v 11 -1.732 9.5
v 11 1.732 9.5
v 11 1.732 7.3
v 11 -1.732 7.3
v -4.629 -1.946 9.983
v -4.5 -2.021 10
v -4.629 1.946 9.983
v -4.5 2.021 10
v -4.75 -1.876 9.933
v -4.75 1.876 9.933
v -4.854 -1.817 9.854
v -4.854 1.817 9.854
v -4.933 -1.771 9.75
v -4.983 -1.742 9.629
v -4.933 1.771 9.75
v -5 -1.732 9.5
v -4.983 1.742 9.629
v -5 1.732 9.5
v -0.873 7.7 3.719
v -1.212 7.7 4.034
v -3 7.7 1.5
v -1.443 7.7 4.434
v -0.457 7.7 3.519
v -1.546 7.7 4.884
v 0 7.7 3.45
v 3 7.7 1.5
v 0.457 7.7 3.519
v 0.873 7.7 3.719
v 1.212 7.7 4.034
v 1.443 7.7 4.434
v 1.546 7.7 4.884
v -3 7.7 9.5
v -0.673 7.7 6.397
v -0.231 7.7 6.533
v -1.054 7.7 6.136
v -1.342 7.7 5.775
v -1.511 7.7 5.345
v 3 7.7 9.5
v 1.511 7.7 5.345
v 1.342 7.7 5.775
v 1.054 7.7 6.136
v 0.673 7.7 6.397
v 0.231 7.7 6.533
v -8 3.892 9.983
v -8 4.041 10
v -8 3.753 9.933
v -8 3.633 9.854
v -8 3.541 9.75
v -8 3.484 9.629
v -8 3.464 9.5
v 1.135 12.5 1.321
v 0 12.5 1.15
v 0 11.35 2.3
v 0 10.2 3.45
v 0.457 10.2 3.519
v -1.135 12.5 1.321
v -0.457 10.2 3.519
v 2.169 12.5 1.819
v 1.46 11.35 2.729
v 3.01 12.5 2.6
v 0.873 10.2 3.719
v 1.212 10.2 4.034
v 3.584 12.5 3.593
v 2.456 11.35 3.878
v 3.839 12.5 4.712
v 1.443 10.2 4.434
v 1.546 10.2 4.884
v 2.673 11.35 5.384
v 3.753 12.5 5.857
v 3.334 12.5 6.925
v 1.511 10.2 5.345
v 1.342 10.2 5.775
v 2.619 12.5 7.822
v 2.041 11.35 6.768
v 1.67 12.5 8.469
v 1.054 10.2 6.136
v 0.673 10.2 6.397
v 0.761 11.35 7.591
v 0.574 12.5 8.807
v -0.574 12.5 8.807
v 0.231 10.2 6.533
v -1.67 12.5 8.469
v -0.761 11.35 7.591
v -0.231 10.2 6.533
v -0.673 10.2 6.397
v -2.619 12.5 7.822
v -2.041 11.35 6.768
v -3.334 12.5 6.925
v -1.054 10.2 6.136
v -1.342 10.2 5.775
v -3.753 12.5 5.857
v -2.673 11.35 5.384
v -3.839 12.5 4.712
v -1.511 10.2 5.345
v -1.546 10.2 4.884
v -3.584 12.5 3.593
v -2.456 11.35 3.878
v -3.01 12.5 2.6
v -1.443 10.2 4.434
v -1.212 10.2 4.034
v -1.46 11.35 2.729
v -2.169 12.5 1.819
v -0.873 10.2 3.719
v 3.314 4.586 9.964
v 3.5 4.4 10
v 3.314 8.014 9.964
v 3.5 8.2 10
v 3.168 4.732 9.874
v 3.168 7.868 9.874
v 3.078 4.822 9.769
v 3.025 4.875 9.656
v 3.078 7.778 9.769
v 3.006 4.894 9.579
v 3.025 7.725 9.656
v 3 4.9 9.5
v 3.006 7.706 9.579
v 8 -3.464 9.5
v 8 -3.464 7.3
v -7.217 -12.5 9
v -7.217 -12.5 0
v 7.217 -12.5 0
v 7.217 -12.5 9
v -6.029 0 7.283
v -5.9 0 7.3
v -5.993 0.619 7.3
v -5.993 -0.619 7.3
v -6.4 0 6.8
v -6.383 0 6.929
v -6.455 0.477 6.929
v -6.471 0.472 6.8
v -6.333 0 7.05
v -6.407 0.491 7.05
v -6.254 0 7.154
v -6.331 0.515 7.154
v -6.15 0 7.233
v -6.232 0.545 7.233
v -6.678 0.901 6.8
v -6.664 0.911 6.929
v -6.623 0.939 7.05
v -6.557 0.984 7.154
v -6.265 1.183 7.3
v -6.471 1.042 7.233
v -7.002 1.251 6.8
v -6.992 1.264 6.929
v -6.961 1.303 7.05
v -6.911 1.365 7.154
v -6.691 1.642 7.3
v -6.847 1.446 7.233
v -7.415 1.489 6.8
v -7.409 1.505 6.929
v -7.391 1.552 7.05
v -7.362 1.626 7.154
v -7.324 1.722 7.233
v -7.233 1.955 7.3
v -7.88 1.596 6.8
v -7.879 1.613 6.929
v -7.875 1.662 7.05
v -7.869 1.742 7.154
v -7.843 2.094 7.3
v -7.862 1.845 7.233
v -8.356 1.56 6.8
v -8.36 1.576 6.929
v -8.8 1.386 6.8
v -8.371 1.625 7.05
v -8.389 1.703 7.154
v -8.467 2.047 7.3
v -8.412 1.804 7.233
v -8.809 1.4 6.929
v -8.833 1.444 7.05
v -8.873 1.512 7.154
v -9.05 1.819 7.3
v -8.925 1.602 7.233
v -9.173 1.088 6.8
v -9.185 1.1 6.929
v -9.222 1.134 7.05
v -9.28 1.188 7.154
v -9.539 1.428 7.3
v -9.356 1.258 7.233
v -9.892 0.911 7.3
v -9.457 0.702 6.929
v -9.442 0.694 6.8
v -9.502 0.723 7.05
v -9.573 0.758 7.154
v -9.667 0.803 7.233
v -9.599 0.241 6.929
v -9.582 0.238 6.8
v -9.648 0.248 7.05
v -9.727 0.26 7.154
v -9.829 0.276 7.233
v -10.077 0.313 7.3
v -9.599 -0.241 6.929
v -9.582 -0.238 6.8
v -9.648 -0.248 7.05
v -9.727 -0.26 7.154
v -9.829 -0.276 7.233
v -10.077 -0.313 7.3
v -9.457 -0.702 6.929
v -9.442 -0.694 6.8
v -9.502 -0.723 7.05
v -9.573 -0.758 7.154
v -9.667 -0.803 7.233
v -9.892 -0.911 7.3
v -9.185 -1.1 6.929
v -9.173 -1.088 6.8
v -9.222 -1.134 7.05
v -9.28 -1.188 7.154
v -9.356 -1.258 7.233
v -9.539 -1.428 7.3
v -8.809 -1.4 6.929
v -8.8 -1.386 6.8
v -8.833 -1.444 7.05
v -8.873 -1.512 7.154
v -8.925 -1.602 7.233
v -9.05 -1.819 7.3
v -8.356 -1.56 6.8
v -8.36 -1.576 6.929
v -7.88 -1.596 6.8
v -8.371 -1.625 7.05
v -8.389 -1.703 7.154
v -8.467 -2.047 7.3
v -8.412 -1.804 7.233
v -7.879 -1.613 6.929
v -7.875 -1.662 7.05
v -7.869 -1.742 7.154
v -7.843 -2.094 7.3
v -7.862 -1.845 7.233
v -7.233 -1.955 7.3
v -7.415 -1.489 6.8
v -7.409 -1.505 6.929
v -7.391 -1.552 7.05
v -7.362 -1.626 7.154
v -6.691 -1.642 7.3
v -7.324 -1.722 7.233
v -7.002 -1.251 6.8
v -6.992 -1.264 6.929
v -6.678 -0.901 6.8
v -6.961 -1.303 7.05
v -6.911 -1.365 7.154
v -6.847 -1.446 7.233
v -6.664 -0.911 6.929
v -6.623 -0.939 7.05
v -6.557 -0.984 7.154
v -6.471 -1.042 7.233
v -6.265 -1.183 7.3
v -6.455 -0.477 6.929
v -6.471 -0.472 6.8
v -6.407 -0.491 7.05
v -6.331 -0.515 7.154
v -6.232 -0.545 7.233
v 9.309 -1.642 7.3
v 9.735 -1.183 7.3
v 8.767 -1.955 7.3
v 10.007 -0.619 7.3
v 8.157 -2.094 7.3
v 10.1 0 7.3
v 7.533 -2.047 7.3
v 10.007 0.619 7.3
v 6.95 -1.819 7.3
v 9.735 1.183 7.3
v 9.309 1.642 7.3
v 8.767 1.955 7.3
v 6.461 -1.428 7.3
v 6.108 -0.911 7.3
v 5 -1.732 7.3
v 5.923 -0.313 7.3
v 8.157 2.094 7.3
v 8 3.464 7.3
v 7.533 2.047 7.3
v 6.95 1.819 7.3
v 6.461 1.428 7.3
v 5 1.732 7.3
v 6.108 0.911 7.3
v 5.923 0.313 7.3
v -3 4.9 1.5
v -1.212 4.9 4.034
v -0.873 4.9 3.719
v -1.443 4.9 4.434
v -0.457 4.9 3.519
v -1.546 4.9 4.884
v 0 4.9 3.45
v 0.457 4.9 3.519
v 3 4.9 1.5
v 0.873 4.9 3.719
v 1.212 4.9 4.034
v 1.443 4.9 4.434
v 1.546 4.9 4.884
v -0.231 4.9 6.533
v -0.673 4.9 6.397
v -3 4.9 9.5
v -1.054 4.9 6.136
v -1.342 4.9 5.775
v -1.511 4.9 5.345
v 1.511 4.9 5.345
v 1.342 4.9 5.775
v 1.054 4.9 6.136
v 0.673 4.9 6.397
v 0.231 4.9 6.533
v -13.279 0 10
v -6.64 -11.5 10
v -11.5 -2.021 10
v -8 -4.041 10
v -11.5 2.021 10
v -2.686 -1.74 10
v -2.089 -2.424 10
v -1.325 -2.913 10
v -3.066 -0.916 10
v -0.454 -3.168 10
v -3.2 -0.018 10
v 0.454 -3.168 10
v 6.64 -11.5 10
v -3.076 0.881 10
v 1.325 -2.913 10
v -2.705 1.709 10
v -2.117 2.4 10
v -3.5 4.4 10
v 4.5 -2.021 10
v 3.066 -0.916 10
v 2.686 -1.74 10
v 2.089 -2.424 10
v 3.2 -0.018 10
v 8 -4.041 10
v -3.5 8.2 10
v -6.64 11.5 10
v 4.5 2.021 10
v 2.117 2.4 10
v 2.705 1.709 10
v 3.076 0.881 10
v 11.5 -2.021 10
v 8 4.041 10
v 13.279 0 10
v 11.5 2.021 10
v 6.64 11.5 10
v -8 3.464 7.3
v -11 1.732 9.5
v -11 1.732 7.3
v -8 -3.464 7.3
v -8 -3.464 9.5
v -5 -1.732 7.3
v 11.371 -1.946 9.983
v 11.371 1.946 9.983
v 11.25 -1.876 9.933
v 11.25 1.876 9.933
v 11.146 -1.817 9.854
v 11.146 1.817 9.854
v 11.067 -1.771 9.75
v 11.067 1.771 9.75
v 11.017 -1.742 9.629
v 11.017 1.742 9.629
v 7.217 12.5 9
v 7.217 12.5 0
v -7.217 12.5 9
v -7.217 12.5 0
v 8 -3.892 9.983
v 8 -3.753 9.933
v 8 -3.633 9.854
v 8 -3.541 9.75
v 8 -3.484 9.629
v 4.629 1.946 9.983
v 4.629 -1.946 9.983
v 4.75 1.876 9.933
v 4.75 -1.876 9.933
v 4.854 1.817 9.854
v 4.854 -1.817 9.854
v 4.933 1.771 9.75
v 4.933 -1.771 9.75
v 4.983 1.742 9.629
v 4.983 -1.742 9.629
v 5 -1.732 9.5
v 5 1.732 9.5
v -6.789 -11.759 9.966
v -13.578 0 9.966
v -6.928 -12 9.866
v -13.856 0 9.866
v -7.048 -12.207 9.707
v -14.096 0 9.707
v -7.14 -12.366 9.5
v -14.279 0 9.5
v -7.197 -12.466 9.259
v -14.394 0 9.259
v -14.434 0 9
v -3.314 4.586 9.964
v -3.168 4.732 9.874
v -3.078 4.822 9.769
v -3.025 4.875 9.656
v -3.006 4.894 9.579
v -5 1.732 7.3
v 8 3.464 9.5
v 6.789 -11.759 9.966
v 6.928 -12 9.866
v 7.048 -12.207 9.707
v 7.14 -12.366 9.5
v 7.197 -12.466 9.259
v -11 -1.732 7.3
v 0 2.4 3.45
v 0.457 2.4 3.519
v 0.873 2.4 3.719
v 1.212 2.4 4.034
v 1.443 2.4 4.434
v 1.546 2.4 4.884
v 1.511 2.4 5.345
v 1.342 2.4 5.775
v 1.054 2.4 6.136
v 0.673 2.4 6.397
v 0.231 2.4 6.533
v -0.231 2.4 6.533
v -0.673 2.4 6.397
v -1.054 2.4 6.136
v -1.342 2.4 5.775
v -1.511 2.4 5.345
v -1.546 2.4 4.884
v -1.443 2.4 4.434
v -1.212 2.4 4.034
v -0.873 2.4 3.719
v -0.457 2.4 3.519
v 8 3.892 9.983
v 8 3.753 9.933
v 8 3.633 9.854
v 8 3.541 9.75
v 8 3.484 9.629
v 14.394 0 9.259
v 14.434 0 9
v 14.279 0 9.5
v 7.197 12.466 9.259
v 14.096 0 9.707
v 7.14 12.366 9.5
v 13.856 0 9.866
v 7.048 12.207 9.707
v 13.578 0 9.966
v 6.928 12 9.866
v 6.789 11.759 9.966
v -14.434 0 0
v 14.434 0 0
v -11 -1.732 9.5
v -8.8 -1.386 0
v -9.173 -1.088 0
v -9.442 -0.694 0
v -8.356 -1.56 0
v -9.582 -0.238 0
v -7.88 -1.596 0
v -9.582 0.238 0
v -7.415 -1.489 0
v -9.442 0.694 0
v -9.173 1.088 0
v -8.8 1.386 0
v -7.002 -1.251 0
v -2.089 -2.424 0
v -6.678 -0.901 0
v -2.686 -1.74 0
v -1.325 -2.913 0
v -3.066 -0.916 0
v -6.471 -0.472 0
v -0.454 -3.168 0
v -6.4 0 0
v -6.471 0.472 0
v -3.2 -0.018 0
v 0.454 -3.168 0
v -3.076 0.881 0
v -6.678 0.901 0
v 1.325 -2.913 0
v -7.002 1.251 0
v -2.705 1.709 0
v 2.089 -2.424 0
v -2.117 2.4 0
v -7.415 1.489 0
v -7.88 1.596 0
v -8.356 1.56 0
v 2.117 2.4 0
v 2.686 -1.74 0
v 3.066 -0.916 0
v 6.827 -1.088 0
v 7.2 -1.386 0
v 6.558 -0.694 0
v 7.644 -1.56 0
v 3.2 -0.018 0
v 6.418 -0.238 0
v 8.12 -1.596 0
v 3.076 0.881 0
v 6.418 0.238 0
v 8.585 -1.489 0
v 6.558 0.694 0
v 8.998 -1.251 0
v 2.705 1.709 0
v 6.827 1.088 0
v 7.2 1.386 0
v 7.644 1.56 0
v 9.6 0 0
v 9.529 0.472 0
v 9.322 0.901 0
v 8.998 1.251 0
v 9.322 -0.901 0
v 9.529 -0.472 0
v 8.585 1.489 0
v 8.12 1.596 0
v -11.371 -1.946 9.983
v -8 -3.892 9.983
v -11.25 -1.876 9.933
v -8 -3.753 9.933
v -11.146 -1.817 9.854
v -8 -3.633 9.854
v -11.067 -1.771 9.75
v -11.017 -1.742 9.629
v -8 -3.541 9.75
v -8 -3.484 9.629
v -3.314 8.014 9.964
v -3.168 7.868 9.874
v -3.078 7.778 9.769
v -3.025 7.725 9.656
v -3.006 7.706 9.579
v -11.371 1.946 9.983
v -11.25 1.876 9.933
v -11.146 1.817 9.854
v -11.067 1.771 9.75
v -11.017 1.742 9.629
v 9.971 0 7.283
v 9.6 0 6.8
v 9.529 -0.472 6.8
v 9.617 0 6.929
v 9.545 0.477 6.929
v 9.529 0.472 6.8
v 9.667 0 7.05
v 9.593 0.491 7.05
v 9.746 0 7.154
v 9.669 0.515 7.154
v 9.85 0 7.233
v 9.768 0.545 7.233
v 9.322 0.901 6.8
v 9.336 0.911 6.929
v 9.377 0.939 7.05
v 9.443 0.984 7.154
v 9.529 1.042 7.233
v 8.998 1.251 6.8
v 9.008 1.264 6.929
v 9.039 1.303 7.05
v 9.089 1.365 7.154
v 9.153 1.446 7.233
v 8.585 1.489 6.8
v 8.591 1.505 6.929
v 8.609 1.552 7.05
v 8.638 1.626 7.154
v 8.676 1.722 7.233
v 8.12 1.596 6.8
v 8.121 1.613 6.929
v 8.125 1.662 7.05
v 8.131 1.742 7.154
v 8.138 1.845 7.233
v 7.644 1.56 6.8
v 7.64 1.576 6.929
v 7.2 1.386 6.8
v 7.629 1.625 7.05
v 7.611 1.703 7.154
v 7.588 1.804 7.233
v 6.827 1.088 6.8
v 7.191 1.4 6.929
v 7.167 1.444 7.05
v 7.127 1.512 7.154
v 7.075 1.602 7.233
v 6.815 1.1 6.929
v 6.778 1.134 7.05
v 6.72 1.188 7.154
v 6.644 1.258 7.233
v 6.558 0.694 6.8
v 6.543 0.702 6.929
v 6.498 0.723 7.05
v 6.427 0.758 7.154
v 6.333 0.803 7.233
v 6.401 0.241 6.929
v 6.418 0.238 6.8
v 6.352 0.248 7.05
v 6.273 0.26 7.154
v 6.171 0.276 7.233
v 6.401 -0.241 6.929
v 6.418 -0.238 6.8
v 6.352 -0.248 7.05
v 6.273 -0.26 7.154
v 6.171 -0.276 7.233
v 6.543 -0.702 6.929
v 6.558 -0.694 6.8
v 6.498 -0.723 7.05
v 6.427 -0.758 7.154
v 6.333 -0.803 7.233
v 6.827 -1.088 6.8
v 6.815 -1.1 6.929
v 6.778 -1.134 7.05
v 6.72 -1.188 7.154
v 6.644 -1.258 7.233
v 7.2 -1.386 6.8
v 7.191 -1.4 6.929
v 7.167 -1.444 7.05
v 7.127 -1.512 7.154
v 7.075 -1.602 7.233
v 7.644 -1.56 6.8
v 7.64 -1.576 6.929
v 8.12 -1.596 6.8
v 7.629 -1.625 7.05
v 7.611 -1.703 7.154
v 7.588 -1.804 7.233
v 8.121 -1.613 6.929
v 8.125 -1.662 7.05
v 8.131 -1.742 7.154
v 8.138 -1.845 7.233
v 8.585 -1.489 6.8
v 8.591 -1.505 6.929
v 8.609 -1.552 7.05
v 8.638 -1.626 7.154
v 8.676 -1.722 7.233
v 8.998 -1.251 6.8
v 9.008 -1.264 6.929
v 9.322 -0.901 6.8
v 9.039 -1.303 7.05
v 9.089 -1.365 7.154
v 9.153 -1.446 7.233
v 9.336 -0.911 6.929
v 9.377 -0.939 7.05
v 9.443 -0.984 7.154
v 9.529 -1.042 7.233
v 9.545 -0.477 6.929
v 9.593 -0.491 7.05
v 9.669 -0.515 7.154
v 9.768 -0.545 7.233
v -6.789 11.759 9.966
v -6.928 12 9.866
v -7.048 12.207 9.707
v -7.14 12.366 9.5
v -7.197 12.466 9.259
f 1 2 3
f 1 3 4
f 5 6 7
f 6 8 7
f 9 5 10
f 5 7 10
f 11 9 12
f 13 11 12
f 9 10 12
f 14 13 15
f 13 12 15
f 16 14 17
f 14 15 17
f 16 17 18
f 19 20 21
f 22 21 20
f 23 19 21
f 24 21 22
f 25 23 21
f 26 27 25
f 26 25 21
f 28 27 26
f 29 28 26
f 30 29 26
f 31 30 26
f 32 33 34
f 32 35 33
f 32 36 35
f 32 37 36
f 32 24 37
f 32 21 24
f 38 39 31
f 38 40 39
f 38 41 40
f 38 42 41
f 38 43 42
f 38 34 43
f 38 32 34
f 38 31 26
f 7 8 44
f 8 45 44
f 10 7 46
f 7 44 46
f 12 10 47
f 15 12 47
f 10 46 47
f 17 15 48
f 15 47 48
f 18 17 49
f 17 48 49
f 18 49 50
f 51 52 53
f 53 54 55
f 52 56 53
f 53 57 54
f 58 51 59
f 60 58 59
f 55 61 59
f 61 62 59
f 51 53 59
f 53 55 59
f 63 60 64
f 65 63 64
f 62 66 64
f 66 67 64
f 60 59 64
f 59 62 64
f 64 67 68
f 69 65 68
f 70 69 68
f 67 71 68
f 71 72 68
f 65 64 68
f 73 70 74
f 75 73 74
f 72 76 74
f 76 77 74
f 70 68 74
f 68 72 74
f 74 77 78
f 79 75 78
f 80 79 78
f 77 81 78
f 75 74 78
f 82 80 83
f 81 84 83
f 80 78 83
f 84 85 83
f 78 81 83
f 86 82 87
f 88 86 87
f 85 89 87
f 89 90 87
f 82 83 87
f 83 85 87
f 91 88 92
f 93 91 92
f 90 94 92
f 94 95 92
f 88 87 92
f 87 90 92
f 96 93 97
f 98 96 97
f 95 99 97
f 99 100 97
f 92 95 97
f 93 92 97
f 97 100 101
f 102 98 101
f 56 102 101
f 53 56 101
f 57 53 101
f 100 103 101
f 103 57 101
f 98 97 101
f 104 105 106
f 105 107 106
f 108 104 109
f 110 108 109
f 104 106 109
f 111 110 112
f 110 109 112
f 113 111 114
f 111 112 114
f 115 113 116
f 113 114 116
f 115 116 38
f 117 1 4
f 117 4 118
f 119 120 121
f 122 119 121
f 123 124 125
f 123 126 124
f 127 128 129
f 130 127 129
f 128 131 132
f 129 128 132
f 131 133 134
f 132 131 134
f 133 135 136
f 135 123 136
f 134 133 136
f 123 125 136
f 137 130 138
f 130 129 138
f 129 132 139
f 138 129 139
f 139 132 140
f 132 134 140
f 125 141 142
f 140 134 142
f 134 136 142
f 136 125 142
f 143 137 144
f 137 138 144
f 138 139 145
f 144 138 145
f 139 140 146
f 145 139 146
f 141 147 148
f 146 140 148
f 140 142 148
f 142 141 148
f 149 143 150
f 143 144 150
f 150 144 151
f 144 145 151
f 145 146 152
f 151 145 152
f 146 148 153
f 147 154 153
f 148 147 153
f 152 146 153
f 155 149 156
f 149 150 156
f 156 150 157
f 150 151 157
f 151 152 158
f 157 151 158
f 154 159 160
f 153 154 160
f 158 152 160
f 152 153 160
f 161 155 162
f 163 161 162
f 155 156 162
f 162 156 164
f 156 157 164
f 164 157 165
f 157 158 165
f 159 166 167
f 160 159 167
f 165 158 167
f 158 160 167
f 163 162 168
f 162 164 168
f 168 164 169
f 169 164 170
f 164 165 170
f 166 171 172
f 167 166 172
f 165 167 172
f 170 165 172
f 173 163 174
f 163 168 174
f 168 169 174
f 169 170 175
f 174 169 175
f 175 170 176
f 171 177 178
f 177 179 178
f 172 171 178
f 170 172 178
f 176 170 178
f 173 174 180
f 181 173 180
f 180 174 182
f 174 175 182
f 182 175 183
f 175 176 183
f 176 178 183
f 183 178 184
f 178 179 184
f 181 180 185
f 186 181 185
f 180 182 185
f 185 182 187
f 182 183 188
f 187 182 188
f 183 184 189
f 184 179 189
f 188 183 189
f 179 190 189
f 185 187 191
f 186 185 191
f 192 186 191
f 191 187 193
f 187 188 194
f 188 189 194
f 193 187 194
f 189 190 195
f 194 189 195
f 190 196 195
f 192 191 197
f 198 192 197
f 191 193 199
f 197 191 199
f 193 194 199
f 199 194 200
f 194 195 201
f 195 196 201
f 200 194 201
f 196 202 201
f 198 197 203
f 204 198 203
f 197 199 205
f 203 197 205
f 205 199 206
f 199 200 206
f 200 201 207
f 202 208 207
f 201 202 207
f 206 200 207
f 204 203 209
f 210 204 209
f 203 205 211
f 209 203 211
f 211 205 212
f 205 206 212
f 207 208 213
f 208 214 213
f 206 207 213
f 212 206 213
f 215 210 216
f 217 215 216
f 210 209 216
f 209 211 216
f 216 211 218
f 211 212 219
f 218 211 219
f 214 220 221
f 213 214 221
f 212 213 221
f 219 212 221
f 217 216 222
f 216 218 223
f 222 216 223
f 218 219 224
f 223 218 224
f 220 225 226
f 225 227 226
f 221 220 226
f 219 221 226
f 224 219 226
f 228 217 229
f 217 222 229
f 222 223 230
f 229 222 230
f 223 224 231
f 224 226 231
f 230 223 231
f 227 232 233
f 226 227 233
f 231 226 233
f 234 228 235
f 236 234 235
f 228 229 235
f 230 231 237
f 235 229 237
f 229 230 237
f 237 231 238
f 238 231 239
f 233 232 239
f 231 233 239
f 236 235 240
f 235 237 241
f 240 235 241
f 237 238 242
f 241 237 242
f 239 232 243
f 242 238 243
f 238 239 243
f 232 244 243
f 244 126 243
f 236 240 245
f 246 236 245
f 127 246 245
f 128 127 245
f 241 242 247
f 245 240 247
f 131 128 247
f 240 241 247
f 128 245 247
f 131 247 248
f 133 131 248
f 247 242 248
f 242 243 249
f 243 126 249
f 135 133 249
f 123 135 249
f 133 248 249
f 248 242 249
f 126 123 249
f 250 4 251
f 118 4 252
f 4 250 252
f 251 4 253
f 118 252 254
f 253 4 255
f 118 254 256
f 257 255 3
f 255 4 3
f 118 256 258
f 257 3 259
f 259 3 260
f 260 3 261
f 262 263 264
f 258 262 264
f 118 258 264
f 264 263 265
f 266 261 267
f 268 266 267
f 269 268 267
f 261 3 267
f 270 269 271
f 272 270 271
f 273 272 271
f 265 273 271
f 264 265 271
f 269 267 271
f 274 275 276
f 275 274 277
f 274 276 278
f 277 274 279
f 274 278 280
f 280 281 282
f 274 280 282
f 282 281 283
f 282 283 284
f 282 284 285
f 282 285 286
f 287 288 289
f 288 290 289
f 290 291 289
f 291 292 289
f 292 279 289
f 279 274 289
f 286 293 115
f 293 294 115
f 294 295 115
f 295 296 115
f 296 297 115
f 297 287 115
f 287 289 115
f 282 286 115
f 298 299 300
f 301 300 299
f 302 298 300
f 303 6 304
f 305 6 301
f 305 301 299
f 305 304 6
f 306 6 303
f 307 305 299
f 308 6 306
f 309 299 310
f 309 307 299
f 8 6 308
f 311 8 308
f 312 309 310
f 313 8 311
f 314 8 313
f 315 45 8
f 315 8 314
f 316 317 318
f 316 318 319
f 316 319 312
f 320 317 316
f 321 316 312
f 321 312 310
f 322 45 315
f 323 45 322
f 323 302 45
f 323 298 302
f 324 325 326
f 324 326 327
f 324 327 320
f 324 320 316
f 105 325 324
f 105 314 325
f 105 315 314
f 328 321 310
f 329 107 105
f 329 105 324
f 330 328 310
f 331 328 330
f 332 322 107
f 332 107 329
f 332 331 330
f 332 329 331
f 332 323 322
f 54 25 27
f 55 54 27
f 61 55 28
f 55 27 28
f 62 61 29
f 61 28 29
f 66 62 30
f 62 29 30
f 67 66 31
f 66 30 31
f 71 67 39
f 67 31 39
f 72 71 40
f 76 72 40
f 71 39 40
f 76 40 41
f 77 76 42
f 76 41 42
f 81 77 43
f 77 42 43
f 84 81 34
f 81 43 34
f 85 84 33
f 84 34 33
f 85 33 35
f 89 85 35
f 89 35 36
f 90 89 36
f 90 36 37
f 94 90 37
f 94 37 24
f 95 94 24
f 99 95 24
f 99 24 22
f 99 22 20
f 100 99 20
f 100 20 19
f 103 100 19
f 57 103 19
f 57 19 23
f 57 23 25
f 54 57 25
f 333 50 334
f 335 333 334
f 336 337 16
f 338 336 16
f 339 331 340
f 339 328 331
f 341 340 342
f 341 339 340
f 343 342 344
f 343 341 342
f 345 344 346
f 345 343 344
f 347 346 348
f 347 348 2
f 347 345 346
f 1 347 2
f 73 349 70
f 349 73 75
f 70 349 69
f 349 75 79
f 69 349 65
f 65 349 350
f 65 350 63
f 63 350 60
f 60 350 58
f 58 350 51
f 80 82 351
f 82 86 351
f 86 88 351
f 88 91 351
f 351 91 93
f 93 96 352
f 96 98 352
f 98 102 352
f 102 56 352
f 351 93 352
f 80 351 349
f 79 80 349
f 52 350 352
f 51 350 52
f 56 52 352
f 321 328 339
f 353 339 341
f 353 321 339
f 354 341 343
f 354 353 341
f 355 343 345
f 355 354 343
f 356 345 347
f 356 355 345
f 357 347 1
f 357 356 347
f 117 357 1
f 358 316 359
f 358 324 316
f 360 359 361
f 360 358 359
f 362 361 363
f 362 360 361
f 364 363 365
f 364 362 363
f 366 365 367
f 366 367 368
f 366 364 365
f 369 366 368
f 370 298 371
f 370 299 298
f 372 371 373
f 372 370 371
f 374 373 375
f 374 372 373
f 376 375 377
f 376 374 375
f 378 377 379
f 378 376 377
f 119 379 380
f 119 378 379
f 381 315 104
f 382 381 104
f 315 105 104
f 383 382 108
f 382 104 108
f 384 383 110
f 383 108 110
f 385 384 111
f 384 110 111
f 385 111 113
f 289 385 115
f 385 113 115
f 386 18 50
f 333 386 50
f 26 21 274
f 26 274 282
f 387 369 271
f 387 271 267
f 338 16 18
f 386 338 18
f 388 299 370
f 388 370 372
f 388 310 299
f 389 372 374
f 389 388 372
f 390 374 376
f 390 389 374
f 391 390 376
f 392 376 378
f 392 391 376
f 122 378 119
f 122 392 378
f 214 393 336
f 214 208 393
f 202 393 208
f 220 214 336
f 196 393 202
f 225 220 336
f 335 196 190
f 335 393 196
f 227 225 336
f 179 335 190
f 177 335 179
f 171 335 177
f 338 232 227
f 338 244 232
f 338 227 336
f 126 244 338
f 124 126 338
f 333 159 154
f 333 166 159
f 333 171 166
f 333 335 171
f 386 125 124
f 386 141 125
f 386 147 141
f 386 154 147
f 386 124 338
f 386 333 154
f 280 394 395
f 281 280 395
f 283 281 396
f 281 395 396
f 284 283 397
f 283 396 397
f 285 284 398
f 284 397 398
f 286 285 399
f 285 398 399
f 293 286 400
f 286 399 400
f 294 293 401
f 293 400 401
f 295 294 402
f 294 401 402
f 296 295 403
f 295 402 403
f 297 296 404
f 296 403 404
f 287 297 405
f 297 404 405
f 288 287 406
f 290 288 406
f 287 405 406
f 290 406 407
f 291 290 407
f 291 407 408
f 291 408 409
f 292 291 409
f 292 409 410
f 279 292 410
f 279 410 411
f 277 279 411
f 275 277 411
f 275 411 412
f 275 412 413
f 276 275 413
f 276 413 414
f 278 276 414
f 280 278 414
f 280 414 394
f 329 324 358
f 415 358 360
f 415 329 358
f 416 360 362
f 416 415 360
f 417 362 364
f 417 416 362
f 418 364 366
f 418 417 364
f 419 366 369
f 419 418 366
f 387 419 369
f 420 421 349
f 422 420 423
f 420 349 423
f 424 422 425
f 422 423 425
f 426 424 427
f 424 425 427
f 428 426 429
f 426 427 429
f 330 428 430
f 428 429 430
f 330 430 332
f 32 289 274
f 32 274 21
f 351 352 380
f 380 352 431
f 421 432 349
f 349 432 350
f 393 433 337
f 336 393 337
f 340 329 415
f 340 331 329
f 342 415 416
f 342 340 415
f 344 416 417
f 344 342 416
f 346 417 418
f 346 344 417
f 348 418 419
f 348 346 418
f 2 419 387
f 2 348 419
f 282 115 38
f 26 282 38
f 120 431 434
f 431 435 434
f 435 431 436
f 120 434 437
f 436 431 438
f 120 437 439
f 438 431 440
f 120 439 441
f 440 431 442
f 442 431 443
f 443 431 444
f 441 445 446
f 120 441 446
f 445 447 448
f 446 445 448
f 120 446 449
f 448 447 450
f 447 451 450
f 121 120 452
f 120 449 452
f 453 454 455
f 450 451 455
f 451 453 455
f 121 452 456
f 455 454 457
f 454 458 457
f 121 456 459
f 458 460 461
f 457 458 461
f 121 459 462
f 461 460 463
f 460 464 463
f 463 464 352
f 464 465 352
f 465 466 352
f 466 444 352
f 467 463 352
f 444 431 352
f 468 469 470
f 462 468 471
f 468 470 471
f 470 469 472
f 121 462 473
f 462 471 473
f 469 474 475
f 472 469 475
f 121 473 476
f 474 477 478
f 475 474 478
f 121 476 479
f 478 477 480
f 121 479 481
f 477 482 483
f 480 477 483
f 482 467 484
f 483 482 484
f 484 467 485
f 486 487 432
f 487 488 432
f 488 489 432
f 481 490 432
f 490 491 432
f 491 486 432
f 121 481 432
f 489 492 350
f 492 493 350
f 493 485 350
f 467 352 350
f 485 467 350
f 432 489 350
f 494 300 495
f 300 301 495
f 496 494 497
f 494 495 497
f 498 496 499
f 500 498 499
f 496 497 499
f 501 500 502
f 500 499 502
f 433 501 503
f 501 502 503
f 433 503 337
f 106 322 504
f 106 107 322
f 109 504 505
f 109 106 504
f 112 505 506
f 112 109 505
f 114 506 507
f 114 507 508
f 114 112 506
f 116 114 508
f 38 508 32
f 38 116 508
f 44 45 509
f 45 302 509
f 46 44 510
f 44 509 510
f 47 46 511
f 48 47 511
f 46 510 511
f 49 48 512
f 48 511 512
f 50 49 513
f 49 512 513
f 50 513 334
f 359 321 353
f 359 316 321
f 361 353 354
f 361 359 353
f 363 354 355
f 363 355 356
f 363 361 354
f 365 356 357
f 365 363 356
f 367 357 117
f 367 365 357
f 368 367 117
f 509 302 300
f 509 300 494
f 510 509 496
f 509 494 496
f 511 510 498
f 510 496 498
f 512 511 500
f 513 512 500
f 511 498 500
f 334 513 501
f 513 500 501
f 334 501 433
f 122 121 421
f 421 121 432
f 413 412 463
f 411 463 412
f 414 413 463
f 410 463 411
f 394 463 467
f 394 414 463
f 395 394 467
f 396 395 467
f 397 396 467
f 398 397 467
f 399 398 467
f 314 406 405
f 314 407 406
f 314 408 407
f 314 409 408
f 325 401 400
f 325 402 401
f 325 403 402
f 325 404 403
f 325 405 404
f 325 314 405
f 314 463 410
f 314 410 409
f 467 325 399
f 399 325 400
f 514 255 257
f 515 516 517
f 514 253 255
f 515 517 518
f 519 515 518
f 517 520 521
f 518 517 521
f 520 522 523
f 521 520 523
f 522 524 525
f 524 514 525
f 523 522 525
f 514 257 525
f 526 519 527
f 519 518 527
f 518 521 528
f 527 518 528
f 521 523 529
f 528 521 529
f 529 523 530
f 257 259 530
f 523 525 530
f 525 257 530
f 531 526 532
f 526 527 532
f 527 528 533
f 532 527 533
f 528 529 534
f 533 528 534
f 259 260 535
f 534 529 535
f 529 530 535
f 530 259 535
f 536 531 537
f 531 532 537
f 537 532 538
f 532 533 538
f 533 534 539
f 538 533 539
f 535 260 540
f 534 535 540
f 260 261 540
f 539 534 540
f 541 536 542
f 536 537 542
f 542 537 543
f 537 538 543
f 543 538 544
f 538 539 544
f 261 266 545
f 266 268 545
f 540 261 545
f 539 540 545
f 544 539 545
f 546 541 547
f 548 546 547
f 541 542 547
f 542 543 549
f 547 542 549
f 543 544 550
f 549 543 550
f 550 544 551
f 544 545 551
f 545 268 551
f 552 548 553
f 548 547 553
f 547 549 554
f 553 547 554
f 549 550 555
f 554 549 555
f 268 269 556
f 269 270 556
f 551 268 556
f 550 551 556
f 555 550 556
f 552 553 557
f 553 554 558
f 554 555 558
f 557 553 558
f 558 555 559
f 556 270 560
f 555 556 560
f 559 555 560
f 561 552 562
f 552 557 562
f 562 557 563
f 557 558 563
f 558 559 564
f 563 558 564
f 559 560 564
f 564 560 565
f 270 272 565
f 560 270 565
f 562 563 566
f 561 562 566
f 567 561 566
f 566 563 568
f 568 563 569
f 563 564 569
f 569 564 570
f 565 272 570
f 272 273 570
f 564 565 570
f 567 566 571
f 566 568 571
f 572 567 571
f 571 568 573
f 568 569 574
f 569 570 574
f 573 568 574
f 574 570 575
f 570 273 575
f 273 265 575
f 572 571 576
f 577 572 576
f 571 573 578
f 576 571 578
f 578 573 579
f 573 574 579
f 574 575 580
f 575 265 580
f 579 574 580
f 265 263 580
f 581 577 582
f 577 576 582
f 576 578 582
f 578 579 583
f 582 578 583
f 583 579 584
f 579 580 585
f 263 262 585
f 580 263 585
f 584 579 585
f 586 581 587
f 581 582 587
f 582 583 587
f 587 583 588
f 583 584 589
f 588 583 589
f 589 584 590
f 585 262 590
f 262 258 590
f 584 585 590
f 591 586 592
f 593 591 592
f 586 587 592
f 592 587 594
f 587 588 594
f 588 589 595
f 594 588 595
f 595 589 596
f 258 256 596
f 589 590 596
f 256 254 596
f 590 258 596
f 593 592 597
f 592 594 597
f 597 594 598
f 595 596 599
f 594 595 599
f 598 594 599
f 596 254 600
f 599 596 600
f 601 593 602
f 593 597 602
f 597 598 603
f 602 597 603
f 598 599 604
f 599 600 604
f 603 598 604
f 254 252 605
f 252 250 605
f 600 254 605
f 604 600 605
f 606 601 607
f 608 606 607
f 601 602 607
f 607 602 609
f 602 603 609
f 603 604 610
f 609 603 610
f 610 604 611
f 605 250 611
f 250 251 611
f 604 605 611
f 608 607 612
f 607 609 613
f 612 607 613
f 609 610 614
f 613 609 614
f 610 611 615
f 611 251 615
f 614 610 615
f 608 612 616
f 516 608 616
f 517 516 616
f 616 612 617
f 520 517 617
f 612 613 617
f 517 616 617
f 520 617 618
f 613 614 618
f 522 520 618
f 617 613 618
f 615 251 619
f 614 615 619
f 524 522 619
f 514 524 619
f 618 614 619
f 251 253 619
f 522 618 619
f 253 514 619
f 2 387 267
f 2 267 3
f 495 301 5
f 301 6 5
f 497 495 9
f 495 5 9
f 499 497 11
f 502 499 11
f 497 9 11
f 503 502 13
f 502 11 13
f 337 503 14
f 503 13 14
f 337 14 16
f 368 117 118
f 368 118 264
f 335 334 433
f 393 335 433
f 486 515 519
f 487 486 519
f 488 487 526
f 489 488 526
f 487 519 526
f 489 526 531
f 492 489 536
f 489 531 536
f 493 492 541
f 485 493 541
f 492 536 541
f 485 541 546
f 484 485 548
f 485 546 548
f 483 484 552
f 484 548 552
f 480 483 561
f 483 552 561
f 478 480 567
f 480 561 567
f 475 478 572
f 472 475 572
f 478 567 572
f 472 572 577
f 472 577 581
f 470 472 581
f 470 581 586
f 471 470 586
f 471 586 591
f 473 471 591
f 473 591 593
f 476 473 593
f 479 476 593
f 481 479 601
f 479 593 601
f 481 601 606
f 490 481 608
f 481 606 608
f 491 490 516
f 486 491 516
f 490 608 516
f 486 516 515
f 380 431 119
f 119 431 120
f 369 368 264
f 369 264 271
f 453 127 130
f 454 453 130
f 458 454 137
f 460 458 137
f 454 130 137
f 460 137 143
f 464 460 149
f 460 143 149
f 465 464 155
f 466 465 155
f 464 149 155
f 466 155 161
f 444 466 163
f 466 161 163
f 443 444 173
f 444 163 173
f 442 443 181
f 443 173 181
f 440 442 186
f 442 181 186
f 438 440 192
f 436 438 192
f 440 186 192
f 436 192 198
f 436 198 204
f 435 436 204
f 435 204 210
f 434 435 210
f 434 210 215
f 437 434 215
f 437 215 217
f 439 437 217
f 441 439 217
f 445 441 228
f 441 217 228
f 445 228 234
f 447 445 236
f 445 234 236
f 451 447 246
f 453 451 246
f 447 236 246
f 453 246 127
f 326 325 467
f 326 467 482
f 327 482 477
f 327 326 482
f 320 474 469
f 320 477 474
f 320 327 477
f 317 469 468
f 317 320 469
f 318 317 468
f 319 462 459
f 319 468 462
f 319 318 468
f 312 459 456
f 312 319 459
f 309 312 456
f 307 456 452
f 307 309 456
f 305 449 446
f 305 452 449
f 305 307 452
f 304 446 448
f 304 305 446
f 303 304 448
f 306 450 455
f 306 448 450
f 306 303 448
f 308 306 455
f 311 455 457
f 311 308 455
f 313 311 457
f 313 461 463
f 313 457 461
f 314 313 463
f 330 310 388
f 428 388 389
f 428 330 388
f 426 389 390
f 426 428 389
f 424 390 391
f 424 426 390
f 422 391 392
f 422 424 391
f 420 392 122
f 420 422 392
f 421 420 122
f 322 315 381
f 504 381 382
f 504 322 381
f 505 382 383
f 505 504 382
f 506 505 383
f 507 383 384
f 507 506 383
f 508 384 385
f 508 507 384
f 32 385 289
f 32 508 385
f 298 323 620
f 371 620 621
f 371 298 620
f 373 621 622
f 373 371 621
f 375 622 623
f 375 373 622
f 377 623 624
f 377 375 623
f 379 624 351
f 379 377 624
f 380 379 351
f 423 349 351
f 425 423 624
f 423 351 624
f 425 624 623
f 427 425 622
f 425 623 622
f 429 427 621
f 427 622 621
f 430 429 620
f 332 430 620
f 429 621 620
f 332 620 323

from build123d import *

# Parameters (mm, degrees)
EXTRUDE_1_DEPTH     = 10
CUT_EXTRUDE_1_DEPTH = 22.554195261
SKETCH_3_R          = 1.55
CUT_EXTRUDE_2_DEPTH = 10.1
CHAMFER_1_SIZE      = 2.3
SKETCH_4_W          = 6
SKETCH_4_H          = 2.8
CUT_EXTRUDE_3_DEPTH = 8.5
FILLET_1_R          = 1
CUT_EXTRUDE_4_DEPTH = 2.7
SKETCH_6_R          = 1.6
CUT_EXTRUDE_5_DEPTH = 7.3
FILLET_2_R          = 0.5


with BuildPart() as part:
    # Эскиз1 → Бобышка-Вытянуть1 (new body)
    with BuildSketch(Plane.XY):
        Polygon((7.216878365, -12.5), (14.43375673, 0), (7.216878365, 12.5), (-7.216878365, 12.5), (-14.43375673, 0), (-7.216878365, -12.5), align=None)
    extrude(amount=EXTRUDE_1_DEPTH)

    # Эскиз2 → Вырез-Вытянуть1 (cut, through all)
    with BuildSketch(Plane.XY.offset(10)):
        with BuildLine():
            Line((-2.116601049, 2.4), (2.116601049, 2.4))
            ThreePointArc((2.116601049, 2.4), (0, -3.2), (-2.116601049, 2.4))
        make_face()
    extrude(amount=-CUT_EXTRUDE_1_DEPTH, mode=Mode.SUBTRACT)

    # Эскиз3 → Вырез-Вытянуть2 (cut)
    with BuildSketch(Plane.XZ.offset(-2.4)):
        with Locations(Location((0, 5, 0), (0, 0, 270))):
            Circle(SKETCH_3_R)
    extrude(amount=-CUT_EXTRUDE_2_DEPTH, mode=Mode.SUBTRACT)

    # Фаска1
    chamfer_1_edges = [part.edges().sort_by_distance(p)[0] for p in [
        (0, 12.5, 6.55),
    ]]
    chamfer(chamfer_1_edges, length=CHAMFER_1_SIZE)

    # Эскиз4 → Вырез-Вытянуть3 (cut)
    with BuildSketch(Plane.XY.offset(10)):
        with Locations((0, 6.3)):
            Rectangle(SKETCH_4_W, SKETCH_4_H)
    extrude(amount=-CUT_EXTRUDE_3_DEPTH, mode=Mode.SUBTRACT)

    # Скругление1
    fillet_1_edges = [part.edges().sort_by_distance(p)[0] for p in [
        (10.825317547, 6.25, 10),
        (0, 12.5, 10),
        (-10.825317547, 6.25, 10),
        (-10.825317547, -6.25, 10),
        (0, -12.5, 10),
        (10.825317547, -6.25, 10),
    ]]
    fillet(fillet_1_edges, radius=FILLET_1_R)

    # Эскиз5 → Вырез-Вытянуть4 (cut)
    with BuildSketch(Plane.XY.offset(10)):
        Polygon((-11, -1.732050808), (-8, -3.464101615), (-5, -1.732050808), (-5, 1.732050808), (-8, 3.464101615), (-11, 1.732050808), align=None)
        Polygon((8, -3.464101615), (5, -1.732050808), (5, 1.732050808), (8, 3.464101615), (11, 1.732050808), (11, -1.732050808), align=None)
    extrude(amount=-CUT_EXTRUDE_4_DEPTH, mode=Mode.SUBTRACT)

    # Эскиз6 → Вырез-Вытянуть5 (cut)
    with BuildSketch(Plane.XY.offset(7.3)):
        with Locations((-8, 0)):
            Circle(SKETCH_6_R)
        with Locations((8, 0)):
            Circle(SKETCH_6_R)
    extrude(amount=-CUT_EXTRUDE_5_DEPTH, mode=Mode.SUBTRACT)

    # Скругление2
    fillet_2_edges = [part.edges().sort_by_distance(p)[0] for p in [
        (-9.6, 0, 7.3),
        (6.4, 0, 7.3),
        (3, 6.3, 10),
        (0, 7.7, 10),
        (-3, 6.3, 10),
        (0, 4.9, 10),
        (9.5, -2.598076211, 10),
        (11, 0, 10),
        (9.5, 2.598076211, 10),
        (6.5, 2.598076211, 10),
        (5, 0, 10),
        (6.5, -2.598076211, 10),
        (-11, 0, 10),
        (-9.5, -2.598076211, 10),
        (-6.5, -2.598076211, 10),
        (-5, 0, 10),
        (-6.5, 2.598076211, 10),
        (-9.5, 2.598076211, 10),
    ]]
    fillet(fillet_2_edges, radius=FILLET_2_R)


solid = part.part
